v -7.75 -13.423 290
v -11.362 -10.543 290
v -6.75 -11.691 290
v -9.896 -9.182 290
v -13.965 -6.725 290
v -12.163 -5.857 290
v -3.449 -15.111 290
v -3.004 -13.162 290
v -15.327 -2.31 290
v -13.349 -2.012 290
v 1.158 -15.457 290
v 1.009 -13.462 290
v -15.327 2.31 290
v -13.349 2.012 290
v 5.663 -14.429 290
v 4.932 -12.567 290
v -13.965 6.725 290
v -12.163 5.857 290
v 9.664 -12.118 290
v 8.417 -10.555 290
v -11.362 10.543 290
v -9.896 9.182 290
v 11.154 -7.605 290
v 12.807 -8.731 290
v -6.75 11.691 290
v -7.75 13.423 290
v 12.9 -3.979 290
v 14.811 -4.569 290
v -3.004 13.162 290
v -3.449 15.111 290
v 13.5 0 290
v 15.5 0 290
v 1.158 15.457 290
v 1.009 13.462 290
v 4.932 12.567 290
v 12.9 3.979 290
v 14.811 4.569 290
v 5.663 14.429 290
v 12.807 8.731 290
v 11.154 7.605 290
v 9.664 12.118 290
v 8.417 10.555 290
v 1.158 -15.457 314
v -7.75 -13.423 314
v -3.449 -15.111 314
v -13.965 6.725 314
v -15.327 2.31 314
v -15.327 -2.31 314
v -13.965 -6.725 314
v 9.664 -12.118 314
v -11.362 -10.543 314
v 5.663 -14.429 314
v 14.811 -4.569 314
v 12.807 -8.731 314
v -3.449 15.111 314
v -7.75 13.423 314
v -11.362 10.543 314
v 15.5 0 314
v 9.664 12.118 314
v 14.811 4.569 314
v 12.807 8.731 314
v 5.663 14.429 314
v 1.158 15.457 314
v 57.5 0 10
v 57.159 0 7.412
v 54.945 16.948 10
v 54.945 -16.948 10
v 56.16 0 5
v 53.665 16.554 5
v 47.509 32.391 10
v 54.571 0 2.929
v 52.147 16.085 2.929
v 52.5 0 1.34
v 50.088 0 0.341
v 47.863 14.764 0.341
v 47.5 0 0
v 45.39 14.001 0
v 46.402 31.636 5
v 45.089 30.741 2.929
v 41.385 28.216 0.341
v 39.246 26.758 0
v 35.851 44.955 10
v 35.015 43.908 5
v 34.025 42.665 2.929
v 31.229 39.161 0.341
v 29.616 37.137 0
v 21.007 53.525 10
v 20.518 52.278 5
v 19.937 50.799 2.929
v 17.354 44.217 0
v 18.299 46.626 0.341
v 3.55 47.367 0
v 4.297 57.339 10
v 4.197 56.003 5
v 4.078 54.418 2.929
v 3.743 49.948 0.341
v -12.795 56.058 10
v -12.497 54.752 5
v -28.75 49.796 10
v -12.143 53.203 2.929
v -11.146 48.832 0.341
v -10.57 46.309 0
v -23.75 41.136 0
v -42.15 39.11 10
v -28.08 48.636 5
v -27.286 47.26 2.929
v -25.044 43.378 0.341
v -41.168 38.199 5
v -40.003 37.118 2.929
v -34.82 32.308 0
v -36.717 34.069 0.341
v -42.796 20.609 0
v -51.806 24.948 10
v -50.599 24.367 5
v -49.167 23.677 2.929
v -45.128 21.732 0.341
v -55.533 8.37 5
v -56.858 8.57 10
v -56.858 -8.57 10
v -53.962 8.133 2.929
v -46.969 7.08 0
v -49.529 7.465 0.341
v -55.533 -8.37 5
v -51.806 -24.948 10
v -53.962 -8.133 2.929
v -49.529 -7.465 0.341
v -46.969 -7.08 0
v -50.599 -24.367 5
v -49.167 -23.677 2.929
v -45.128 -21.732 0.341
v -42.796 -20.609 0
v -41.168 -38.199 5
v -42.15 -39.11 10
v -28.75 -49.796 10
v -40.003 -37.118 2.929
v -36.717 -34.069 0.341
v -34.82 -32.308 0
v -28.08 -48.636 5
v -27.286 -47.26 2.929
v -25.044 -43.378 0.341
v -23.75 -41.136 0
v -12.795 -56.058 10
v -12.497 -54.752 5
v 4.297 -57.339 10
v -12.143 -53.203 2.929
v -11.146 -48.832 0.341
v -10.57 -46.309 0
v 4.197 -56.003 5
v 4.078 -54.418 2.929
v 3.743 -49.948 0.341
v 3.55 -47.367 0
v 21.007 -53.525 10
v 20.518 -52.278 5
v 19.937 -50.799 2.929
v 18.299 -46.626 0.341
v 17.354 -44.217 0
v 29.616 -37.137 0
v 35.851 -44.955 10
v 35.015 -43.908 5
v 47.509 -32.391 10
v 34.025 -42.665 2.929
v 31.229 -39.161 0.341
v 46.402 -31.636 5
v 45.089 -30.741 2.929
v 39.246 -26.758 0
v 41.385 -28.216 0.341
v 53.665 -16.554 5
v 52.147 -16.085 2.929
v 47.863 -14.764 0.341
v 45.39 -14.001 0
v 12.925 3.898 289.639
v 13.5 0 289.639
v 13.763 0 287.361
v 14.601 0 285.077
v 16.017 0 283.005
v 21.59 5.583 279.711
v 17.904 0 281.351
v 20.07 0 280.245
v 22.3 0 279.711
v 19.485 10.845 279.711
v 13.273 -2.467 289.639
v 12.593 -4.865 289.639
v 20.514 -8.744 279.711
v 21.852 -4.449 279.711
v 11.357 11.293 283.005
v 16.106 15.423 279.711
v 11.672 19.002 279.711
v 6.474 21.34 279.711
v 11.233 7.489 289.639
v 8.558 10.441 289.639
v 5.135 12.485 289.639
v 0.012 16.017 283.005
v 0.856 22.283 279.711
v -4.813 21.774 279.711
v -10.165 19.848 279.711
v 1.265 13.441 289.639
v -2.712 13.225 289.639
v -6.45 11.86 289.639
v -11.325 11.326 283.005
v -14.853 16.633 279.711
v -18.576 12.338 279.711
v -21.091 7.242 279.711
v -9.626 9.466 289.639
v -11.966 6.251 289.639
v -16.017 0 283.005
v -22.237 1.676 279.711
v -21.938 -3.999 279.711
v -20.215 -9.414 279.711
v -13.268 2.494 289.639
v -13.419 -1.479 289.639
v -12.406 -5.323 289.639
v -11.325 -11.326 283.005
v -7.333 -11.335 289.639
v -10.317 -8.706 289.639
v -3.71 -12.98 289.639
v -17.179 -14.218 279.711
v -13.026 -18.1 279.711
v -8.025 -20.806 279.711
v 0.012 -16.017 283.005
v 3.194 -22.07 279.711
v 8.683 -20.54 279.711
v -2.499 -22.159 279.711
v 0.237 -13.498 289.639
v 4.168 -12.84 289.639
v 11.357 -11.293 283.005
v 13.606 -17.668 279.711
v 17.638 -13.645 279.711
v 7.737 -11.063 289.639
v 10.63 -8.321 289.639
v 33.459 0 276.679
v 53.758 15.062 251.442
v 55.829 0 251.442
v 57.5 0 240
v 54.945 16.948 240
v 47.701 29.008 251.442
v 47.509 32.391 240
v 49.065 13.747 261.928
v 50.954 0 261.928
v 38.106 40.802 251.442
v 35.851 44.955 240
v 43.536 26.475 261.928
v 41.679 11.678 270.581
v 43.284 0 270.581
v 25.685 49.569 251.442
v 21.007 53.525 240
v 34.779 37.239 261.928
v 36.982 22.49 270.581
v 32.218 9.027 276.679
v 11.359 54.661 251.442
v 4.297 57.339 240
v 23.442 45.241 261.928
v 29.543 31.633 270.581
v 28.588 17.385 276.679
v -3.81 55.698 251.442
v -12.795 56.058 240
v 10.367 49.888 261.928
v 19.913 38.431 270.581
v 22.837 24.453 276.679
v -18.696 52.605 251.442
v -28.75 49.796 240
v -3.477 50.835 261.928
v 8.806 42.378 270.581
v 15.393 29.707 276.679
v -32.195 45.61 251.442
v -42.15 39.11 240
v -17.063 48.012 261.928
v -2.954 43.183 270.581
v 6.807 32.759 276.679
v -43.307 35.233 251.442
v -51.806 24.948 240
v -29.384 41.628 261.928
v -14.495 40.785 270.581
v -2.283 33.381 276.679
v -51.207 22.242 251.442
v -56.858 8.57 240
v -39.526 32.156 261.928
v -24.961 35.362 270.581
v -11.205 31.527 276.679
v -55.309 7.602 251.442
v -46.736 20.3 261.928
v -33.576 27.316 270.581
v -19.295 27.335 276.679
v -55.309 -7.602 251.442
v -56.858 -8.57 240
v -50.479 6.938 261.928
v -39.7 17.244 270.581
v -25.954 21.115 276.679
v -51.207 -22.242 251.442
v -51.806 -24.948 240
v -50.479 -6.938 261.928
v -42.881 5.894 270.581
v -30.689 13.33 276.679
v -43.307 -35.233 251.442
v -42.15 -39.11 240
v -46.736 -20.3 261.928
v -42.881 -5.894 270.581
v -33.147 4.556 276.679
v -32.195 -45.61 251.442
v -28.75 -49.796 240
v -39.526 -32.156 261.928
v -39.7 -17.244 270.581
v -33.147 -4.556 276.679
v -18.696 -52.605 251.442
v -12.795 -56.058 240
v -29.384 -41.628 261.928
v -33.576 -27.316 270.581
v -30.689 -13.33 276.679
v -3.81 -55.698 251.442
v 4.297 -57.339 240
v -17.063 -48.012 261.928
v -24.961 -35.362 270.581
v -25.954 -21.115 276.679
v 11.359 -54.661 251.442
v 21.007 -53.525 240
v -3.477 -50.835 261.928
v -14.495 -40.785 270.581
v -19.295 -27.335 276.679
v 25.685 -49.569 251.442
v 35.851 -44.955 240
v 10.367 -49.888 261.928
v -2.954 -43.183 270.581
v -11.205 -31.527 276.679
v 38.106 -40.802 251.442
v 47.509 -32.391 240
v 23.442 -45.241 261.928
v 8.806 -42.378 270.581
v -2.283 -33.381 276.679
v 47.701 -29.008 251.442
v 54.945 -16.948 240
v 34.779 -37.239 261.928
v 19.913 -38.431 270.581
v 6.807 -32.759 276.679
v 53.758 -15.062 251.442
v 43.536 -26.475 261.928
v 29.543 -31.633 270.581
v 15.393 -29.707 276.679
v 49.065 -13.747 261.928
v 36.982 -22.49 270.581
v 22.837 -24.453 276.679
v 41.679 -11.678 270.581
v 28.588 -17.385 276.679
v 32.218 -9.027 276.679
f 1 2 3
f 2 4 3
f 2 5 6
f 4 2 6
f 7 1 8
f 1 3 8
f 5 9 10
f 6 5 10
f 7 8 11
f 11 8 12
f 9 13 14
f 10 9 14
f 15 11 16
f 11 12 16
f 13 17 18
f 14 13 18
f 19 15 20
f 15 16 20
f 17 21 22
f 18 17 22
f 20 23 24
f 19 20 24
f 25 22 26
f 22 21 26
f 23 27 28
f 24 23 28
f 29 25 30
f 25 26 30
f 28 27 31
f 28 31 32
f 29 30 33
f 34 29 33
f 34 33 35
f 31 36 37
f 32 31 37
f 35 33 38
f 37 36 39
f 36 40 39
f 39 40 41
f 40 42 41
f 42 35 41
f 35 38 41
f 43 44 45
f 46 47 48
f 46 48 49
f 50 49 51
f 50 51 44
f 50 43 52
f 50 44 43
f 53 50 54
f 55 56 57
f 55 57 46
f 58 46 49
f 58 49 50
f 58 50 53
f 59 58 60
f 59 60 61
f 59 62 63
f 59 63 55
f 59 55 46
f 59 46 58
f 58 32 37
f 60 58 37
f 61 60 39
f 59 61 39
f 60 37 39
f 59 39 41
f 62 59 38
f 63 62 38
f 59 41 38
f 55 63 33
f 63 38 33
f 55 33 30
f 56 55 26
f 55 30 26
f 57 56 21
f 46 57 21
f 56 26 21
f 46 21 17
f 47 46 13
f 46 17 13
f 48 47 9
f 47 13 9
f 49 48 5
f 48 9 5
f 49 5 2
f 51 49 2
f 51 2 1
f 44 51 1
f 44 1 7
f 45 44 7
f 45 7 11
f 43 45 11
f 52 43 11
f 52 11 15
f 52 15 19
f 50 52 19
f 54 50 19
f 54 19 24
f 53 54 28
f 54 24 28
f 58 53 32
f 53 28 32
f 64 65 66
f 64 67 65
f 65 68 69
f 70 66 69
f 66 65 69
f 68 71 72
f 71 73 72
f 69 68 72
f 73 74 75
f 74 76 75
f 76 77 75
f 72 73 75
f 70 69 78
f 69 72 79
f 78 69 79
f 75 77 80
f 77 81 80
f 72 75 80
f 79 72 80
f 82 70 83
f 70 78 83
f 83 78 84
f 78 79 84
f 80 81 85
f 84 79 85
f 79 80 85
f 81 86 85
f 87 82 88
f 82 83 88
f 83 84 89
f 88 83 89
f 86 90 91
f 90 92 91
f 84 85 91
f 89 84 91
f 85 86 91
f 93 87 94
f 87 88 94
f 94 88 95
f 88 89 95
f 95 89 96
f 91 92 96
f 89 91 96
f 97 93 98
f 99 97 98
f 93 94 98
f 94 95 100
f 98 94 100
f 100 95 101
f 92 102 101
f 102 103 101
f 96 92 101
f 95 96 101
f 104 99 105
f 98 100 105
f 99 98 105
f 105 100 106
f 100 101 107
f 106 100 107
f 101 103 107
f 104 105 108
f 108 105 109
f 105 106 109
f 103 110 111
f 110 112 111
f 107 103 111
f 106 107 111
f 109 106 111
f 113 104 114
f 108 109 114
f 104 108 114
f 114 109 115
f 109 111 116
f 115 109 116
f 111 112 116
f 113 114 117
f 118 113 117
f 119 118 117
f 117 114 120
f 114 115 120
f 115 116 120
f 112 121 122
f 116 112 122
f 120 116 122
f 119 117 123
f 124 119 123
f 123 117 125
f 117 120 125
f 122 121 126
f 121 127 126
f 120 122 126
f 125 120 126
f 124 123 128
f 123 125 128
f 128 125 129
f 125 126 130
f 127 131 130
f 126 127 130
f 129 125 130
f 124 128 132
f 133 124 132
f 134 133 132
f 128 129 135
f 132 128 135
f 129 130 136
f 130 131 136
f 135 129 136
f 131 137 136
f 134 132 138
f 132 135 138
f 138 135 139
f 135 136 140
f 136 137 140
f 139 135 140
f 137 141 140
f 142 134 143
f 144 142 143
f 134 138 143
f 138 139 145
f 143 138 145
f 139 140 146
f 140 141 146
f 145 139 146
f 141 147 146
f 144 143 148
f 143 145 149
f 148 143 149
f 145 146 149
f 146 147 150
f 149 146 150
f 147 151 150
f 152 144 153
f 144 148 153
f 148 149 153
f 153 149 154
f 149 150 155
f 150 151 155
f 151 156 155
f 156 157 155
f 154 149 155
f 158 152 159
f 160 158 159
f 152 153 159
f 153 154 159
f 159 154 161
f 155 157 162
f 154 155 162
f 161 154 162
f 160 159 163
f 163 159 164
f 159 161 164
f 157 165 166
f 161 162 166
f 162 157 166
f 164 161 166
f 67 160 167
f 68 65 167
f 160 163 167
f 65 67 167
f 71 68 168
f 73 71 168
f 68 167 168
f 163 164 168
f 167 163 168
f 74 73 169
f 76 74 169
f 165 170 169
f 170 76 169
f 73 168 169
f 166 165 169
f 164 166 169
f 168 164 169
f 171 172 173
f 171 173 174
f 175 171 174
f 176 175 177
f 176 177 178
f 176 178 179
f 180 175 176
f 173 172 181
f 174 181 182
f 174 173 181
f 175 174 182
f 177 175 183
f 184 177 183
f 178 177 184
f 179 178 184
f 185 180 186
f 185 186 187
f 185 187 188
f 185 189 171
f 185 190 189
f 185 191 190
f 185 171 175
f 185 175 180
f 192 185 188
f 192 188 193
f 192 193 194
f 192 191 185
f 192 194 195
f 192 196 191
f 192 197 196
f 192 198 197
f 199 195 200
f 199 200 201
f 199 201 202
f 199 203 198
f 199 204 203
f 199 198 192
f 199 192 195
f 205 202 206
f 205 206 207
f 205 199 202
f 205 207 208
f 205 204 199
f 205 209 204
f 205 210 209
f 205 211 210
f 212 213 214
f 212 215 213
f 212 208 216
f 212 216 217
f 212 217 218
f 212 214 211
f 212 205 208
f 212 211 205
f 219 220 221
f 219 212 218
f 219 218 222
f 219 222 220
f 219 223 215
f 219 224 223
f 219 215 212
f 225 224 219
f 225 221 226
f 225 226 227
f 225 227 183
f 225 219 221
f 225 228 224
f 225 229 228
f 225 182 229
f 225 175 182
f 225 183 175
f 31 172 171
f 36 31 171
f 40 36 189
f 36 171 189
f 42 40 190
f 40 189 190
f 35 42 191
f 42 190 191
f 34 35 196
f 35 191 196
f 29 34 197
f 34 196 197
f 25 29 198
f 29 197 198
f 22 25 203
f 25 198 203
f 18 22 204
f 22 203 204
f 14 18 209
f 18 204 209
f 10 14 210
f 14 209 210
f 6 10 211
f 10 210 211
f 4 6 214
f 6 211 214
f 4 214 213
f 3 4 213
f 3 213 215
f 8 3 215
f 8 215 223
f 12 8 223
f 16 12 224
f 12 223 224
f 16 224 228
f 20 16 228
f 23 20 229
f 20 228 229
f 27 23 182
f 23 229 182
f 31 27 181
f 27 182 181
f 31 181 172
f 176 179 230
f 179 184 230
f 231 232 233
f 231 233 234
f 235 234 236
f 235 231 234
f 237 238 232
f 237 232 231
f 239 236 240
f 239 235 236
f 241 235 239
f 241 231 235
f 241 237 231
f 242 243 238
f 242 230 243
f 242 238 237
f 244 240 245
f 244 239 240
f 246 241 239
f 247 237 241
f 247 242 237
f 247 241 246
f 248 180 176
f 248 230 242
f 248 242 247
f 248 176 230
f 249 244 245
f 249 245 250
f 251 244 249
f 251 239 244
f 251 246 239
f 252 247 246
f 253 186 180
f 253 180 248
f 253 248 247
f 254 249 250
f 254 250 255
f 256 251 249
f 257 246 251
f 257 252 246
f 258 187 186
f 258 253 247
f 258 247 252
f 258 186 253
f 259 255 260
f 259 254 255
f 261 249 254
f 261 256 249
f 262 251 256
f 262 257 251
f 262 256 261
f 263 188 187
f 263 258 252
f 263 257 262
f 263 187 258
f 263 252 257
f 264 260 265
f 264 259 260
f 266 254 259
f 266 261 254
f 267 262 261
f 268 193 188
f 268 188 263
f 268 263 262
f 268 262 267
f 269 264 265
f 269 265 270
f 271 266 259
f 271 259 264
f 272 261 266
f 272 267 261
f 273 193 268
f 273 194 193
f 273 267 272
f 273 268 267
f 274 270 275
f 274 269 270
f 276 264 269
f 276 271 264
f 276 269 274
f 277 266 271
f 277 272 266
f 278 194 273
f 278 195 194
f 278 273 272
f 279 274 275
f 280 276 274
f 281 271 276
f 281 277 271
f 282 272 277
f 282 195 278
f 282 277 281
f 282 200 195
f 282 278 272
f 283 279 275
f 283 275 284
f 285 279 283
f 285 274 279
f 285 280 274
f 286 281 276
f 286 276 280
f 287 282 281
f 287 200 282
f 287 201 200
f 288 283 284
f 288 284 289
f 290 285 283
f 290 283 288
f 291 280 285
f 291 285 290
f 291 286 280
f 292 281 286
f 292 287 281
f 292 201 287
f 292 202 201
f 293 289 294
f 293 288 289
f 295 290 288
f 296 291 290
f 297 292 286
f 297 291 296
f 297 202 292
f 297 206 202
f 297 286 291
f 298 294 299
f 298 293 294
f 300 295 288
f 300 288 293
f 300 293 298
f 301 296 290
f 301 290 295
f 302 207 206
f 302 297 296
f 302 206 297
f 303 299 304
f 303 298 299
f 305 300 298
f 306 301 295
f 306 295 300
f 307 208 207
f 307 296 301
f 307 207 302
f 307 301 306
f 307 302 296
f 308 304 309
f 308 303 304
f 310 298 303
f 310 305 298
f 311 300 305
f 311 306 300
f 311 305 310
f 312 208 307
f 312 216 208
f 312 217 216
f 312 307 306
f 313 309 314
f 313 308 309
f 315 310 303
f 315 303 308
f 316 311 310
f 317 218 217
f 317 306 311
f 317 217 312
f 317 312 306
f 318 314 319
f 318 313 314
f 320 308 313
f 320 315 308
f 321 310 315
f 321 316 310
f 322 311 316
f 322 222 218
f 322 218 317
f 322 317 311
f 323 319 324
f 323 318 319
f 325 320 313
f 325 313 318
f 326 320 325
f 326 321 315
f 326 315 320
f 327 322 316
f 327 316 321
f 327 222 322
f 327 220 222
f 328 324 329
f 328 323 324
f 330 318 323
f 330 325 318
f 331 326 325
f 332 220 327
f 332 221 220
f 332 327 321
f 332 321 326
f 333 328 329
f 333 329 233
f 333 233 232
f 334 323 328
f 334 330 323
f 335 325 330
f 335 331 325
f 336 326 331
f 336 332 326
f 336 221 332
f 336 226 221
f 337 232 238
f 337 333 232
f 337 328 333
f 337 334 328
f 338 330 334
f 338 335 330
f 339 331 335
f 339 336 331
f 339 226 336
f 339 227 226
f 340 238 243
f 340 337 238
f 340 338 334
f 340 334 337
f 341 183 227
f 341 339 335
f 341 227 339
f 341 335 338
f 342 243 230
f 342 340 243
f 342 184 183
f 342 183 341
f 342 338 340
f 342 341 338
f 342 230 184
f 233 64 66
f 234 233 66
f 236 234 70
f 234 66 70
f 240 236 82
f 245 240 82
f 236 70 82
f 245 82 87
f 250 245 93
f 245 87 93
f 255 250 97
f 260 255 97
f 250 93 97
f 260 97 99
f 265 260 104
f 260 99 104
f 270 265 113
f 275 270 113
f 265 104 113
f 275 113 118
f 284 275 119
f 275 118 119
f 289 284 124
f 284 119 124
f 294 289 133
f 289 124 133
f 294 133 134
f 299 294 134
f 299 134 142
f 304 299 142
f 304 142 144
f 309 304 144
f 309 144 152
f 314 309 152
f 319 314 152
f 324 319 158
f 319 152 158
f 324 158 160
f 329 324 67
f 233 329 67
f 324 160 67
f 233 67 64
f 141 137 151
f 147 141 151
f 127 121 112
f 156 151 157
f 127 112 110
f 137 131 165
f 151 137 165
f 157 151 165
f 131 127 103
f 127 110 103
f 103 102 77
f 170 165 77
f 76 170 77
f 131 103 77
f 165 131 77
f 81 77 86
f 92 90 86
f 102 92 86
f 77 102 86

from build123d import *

# Parameters (mm, degrees)
SKETCH1_R           = 57.5
BOSS_EXTRUDE1_DEPTH = 280
FILLET1_R           = 40
SKETCH2_R           = 13.5
BOSS_EXTRUDE2_DEPTH = 10
SKETCH3_R           = 15.5
BOSS_EXTRUDE3_DEPTH = 24
FILLET2_R           = 10
FILLET3_R           = 10


with BuildPart() as part:
    # Sketch1 → Boss-Extrude1 (new body)
    with BuildSketch(Plane.XY):
        Circle(SKETCH1_R)
    extrude(amount=BOSS_EXTRUDE1_DEPTH)

    # Fillet1
    fillet1_edges = [part.edges().sort_by_distance(p)[0] for p in [
        (-57.5, 0, 280),
    ]]
    fillet(fillet1_edges, radius=FILLET1_R)

    # Sketch2 → Boss-Extrude2 (add)
    with BuildSketch(Plane.XY.offset(280)):
        Circle(SKETCH2_R)
    extrude(amount=BOSS_EXTRUDE2_DEPTH)

    # Sketch3 → Boss-Extrude3 (add)
    with BuildSketch(Plane.XY.offset(290)):
        Circle(SKETCH3_R)
    extrude(amount=BOSS_EXTRUDE3_DEPTH)

    # Fillet2
    fillet2_edges = [part.edges().sort_by_distance(p)[0] for p in [
        (-13.5, 0, 280),
    ]]
    fillet(fillet2_edges, radius=FILLET2_R - 0.0001)  # a hair under: the kernel refuses the full size

    # Fillet3
    fillet3_edges = [part.edges().sort_by_distance(p)[0] for p in [
        (-57.5, 0, 0),
    ]]
    fillet(fillet3_edges, radius=FILLET3_R)


solid = part.part
